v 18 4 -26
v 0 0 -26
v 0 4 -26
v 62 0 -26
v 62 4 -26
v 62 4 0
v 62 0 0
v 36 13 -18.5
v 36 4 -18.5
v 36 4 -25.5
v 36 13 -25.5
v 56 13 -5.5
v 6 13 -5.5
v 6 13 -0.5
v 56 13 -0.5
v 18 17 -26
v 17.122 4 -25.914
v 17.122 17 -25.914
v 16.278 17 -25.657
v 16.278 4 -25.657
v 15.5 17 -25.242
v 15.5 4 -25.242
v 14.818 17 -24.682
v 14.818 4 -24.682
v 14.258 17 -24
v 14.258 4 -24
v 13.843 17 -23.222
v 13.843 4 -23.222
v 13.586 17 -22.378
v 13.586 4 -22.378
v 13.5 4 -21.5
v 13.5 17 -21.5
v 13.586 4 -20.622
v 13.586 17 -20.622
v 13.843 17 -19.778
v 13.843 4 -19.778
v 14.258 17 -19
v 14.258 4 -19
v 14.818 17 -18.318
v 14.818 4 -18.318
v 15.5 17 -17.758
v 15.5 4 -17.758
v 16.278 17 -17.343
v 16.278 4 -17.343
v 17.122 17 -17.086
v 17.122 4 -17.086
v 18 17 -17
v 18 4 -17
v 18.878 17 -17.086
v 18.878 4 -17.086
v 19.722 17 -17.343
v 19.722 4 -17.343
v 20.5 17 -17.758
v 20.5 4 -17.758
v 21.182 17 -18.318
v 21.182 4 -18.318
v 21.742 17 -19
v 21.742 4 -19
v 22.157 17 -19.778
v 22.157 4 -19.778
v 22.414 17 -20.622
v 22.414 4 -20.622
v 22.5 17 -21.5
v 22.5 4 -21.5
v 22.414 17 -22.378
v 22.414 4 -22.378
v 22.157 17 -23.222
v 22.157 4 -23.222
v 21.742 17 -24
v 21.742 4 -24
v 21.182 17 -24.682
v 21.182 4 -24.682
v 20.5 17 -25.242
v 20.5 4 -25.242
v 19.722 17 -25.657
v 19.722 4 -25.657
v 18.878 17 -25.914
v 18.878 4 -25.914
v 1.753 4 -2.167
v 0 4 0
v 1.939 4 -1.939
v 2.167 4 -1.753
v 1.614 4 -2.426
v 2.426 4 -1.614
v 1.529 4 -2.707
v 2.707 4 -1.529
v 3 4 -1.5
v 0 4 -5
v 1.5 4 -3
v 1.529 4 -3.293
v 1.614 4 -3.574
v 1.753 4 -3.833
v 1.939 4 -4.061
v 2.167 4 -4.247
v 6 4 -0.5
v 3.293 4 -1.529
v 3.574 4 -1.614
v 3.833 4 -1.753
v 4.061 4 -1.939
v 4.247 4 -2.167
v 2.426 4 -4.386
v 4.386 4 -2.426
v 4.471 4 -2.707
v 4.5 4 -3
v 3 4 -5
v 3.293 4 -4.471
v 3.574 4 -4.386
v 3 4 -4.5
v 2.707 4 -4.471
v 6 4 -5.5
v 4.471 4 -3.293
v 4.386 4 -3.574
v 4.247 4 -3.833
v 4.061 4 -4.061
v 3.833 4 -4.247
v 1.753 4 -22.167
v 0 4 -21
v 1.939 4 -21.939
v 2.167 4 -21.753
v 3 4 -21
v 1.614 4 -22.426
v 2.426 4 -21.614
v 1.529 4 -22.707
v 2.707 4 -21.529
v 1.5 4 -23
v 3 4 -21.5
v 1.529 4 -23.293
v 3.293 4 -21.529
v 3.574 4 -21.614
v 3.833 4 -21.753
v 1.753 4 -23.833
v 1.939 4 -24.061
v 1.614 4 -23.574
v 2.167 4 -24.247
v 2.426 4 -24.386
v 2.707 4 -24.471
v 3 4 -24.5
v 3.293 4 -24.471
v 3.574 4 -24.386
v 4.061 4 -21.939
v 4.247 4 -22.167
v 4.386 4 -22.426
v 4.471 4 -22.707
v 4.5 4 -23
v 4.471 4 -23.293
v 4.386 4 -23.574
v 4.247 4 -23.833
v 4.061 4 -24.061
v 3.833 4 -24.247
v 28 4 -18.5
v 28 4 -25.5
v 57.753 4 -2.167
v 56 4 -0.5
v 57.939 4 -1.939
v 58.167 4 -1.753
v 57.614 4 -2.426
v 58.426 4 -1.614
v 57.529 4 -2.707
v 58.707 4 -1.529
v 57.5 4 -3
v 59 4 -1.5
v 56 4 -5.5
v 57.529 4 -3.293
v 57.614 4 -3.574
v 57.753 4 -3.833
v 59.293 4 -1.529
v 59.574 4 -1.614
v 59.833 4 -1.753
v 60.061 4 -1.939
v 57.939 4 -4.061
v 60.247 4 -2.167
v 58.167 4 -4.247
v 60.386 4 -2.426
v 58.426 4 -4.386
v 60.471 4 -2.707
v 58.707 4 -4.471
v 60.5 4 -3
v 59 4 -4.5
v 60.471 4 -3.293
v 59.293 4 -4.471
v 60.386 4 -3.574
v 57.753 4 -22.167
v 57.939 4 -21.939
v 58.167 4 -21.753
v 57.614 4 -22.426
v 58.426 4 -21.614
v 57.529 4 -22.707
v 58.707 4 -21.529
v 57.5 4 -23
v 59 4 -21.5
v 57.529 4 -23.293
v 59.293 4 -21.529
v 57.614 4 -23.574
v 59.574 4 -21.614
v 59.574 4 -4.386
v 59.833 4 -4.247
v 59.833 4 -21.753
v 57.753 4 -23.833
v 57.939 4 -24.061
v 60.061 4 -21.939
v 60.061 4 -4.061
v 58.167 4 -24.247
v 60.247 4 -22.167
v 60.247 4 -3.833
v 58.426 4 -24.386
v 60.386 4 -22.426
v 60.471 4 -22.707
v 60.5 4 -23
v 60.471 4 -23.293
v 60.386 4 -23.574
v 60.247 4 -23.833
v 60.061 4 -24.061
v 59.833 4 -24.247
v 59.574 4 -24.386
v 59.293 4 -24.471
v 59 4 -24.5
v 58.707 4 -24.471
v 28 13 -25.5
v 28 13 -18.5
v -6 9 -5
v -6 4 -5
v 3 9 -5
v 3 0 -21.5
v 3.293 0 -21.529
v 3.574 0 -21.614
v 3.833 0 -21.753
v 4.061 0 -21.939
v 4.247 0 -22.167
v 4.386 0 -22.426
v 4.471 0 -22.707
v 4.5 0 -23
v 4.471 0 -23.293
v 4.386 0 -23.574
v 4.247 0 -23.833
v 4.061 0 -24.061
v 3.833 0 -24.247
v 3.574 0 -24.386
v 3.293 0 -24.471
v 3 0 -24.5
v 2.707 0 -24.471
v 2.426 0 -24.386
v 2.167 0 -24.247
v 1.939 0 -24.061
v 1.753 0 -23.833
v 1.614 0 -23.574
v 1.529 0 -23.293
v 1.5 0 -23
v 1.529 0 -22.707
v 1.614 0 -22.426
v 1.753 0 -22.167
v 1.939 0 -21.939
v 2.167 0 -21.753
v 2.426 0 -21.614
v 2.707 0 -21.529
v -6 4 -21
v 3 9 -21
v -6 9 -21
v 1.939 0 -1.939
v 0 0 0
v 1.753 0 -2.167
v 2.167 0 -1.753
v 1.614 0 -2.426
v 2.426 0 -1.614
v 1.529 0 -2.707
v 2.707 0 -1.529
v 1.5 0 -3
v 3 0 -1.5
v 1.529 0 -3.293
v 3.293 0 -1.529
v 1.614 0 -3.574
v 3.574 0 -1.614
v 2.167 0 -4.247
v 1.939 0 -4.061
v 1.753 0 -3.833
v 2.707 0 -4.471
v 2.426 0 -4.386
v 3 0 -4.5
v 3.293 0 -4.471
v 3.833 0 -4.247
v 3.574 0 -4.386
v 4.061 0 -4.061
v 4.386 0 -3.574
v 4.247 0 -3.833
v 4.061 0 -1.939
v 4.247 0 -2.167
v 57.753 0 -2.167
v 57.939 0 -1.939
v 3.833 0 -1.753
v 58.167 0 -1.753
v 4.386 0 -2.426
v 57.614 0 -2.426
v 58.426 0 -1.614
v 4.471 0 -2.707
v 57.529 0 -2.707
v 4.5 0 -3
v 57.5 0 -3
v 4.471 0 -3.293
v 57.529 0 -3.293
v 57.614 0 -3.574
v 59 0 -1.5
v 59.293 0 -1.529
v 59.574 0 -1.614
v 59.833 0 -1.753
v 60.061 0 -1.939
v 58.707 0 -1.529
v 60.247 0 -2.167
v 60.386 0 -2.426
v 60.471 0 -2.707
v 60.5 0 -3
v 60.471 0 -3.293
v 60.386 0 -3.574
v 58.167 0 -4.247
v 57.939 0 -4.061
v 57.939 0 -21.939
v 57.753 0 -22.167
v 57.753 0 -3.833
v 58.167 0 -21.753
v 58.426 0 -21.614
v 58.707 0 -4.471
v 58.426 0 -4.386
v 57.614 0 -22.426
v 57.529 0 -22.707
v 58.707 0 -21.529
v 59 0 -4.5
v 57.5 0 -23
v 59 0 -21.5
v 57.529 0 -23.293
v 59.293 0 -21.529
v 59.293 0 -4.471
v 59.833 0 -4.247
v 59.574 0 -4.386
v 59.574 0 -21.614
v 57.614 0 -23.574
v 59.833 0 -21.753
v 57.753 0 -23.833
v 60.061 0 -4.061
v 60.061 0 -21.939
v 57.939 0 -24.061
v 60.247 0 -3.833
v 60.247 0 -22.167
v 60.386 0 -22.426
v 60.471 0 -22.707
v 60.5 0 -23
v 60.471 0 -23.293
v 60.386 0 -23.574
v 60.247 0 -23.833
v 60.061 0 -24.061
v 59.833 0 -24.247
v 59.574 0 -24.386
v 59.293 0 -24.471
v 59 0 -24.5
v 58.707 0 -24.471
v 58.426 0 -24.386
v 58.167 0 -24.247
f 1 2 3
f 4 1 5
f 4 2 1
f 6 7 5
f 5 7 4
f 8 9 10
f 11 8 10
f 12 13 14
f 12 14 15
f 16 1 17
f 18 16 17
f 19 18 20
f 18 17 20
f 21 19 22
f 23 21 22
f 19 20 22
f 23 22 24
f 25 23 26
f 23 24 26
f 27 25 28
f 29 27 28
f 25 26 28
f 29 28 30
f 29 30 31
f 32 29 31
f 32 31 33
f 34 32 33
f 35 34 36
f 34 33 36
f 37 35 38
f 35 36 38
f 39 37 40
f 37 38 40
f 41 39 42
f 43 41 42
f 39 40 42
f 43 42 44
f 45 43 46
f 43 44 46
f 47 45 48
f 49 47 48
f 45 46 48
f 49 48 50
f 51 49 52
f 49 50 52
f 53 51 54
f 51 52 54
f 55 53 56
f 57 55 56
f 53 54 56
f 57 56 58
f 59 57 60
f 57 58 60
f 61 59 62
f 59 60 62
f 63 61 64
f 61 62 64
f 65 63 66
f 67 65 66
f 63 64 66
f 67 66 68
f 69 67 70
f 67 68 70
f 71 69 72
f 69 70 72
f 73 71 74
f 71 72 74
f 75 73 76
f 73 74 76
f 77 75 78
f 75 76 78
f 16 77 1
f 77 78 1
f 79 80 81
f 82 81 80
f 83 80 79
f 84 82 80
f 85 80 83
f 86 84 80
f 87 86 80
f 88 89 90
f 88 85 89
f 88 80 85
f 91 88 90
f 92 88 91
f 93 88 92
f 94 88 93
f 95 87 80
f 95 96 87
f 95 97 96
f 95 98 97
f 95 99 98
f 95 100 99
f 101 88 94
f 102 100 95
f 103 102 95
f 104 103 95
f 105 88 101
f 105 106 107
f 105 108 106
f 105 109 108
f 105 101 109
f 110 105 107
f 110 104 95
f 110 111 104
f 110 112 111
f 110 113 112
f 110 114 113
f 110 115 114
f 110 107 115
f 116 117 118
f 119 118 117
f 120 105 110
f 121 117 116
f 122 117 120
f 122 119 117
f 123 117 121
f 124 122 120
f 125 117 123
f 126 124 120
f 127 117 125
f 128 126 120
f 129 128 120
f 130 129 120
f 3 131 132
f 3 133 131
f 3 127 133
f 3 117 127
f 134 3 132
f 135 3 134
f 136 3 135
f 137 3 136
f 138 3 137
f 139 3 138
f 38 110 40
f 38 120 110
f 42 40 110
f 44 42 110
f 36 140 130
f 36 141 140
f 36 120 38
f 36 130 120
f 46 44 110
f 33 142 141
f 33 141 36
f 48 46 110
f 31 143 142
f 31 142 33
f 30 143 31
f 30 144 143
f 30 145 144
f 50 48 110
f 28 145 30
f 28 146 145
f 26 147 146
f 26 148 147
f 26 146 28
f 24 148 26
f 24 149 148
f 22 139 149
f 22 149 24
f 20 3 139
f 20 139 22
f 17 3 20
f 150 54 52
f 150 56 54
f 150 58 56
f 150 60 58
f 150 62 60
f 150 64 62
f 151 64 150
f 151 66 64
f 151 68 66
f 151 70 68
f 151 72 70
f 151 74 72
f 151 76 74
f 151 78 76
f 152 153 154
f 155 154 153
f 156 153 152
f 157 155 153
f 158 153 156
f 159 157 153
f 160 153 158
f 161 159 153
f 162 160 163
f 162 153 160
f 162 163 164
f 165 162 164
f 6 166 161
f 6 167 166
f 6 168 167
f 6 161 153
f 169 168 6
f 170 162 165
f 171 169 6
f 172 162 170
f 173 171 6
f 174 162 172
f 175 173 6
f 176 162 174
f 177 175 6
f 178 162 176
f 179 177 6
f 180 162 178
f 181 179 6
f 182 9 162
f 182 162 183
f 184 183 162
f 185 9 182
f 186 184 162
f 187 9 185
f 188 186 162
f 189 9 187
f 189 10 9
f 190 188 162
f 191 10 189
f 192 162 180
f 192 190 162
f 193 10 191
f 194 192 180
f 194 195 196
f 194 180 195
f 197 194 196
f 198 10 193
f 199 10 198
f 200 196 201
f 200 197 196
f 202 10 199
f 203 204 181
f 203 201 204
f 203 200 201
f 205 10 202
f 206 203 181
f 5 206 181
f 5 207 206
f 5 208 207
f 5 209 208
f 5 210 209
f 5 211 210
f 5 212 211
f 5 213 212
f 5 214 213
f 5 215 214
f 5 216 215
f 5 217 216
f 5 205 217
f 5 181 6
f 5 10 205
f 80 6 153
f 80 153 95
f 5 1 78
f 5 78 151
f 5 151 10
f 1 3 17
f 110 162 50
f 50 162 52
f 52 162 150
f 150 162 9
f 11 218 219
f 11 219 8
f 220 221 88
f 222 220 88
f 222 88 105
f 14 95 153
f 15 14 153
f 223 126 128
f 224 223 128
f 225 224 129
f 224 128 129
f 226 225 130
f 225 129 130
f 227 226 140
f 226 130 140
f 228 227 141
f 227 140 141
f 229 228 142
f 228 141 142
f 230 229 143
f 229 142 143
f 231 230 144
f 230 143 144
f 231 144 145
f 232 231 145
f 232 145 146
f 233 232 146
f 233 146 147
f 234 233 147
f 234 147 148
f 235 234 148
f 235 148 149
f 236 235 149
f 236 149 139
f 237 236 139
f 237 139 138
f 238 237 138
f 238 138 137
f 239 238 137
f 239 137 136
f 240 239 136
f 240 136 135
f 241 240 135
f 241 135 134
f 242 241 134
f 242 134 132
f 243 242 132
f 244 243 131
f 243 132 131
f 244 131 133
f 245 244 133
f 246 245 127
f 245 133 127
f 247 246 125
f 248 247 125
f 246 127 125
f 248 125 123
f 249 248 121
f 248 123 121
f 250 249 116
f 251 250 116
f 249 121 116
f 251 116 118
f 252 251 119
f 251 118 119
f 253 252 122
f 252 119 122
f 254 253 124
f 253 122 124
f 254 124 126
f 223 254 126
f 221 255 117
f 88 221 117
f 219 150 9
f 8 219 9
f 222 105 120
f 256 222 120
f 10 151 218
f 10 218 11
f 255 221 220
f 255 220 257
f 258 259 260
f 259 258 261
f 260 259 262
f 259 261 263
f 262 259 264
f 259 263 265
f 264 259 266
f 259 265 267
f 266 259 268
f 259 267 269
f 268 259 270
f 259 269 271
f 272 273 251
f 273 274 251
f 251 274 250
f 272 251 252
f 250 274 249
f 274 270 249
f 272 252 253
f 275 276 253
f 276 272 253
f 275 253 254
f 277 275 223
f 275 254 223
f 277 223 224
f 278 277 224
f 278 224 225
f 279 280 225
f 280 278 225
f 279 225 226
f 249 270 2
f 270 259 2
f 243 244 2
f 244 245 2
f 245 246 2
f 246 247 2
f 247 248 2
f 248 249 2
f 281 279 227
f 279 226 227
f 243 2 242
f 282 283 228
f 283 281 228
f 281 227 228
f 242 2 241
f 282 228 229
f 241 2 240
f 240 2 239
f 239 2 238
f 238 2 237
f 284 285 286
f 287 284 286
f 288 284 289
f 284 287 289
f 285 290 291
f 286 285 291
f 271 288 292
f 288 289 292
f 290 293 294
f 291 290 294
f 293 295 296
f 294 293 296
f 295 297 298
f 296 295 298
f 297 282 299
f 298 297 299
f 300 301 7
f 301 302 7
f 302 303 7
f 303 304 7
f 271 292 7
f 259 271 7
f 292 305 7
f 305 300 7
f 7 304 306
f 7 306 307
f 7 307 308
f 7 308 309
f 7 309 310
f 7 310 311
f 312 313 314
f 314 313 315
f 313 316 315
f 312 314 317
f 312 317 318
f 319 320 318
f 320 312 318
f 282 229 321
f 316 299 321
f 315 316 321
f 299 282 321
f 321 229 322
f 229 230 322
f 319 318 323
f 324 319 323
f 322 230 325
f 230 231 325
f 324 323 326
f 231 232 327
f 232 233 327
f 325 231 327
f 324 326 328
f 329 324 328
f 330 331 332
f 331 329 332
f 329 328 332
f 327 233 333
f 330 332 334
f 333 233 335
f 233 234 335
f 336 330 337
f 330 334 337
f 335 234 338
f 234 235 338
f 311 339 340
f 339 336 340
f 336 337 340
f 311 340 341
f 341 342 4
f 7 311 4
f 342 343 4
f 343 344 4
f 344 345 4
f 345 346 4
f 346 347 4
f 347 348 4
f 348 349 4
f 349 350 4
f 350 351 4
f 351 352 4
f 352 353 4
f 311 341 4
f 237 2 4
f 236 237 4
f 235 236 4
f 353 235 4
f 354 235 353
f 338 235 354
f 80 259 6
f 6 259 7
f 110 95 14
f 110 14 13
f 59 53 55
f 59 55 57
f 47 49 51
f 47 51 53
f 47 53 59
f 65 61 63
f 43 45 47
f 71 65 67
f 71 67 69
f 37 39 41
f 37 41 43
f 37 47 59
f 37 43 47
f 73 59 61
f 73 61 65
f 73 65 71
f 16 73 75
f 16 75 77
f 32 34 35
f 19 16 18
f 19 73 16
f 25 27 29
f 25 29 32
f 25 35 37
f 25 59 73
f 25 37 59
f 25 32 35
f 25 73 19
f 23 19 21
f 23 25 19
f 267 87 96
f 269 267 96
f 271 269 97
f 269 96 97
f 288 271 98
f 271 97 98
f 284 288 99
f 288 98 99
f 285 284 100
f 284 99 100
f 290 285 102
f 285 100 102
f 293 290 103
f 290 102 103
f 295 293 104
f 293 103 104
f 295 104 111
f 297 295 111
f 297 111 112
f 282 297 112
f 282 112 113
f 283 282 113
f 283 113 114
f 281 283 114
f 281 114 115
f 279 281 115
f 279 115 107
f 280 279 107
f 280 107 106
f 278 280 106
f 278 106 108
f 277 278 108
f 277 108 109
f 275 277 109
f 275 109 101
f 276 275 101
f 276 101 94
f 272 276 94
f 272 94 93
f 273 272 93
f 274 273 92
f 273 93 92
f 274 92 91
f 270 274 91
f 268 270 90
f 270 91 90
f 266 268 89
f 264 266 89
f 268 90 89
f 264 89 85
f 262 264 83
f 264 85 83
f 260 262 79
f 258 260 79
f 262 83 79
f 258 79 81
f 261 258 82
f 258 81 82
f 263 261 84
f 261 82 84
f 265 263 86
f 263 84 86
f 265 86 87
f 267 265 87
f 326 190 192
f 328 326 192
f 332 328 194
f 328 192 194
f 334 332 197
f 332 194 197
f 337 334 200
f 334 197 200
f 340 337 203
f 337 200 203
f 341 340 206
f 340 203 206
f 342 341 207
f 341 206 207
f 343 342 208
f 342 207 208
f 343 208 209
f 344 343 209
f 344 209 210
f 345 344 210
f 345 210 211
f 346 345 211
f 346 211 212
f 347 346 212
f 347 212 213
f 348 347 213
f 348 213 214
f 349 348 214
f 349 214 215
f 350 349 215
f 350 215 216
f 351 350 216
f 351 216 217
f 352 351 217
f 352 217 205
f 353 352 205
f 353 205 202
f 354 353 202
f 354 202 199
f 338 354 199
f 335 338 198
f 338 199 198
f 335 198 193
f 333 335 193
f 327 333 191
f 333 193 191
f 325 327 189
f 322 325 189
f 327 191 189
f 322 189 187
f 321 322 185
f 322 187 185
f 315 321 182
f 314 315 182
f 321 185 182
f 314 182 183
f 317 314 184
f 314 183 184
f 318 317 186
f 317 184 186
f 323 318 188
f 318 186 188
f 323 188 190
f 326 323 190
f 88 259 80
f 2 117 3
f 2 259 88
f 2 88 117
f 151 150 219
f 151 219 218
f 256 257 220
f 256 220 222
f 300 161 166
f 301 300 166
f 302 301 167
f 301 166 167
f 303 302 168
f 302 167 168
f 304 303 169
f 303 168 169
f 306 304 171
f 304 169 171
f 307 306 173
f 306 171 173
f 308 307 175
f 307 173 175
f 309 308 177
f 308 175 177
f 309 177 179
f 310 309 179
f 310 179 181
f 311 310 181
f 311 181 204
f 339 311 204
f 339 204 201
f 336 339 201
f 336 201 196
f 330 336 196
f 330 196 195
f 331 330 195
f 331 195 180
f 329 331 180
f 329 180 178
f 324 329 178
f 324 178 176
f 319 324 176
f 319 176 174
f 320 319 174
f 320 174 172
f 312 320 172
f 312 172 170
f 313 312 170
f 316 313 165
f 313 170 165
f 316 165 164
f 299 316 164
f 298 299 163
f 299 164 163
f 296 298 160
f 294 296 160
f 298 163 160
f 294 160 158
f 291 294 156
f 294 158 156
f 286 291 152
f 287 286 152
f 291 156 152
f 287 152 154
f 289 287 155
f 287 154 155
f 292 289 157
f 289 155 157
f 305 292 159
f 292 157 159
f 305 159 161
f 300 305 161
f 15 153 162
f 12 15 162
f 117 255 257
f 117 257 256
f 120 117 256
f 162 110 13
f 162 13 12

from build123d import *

# Parameters (mm, degrees)
SKETCH_1_W          = 62
SKETCH_1_H          = 26
EXTRUDE_1_DEPTH     = 4
SKETCH_2_R          = 1.5
CUT_EXTRUDE_1_DEPTH = 68.349832962
SKETCH_3_W          = 50
SKETCH_3_H          = 5
EXTRUDE_2_DEPTH     = 9
SKETCH_4_R          = 4.5
EXTRUDE_3_DEPTH     = 13
SKETCH_5_W          = 8
SKETCH_5_H          = 7
EXTRUDE_4_DEPTH     = 9
SKETCH_6_W          = 9
SKETCH_6_H          = 16
EXTRUDE_5_DEPTH     = 5


with BuildPart() as part:
    # 草图1 → 凸台-拉伸1 (new body)
    with BuildSketch(Plane(origin=(0, 0, 0), x_dir=(1, 0, 0), z_dir=(0, 1, 0))):
        with Locations((31, 13)):
            Rectangle(SKETCH_1_W, SKETCH_1_H)
    extrude(amount=EXTRUDE_1_DEPTH)

    # 草图2 → 切除-拉伸1 (cut, through all)
    with BuildSketch(Plane(origin=(0, 4, 0), x_dir=(1, 0, 0), z_dir=(0, 1, 0))):
        with Locations(Location((3, 23, 0), (0, 0, 270))):
            Circle(SKETCH_2_R)
        with Locations(Location((3, 3, 0), (0, 0, 270))):
            Circle(SKETCH_2_R)
        with Locations(Location((59, 3, 0), (0, 0, 270))):
            Circle(SKETCH_2_R)
        with Locations(Location((59, 23, 0), (0, 0, 270))):
            Circle(SKETCH_2_R)
    extrude(amount=-CUT_EXTRUDE_1_DEPTH, mode=Mode.SUBTRACT)

    # 草图3 → 凸台-拉伸2 (add)
    with BuildSketch(Plane(origin=(0, 4, 0), x_dir=(1, 0, 0), z_dir=(0, 1, 0))):
        with Locations((31, 3)):
            Rectangle(SKETCH_3_W, SKETCH_3_H)
    extrude(amount=EXTRUDE_2_DEPTH)

    # 草图4 → 凸台-拉伸3 (add)
    with BuildSketch(Plane(origin=(0, 4, 0), x_dir=(1, 0, 0), z_dir=(0, 1, 0))):
        with Locations(Location((18, 21.5, 0), (0, 0, 90))):
            Circle(SKETCH_4_R)
    extrude(amount=EXTRUDE_3_DEPTH)

    # 草图5 → 凸台-拉伸4 (add)
    with BuildSketch(Plane(origin=(0, 4, 0), x_dir=(1, 0, 0), z_dir=(0, 1, 0))):
        with Locations((32, 22)):
            Rectangle(SKETCH_5_W, SKETCH_5_H)
    extrude(amount=EXTRUDE_4_DEPTH)

    # 草图6 → 凸台-拉伸5 (add)
    with BuildSketch(Plane(origin=(0, 4, 0), x_dir=(1, 0, 0), z_dir=(0, 1, 0))):
        with Locations((-1.5, 13)):
            Rectangle(SKETCH_6_W, SKETCH_6_H)
    extrude(amount=EXTRUDE_5_DEPTH)


solid = part.part
